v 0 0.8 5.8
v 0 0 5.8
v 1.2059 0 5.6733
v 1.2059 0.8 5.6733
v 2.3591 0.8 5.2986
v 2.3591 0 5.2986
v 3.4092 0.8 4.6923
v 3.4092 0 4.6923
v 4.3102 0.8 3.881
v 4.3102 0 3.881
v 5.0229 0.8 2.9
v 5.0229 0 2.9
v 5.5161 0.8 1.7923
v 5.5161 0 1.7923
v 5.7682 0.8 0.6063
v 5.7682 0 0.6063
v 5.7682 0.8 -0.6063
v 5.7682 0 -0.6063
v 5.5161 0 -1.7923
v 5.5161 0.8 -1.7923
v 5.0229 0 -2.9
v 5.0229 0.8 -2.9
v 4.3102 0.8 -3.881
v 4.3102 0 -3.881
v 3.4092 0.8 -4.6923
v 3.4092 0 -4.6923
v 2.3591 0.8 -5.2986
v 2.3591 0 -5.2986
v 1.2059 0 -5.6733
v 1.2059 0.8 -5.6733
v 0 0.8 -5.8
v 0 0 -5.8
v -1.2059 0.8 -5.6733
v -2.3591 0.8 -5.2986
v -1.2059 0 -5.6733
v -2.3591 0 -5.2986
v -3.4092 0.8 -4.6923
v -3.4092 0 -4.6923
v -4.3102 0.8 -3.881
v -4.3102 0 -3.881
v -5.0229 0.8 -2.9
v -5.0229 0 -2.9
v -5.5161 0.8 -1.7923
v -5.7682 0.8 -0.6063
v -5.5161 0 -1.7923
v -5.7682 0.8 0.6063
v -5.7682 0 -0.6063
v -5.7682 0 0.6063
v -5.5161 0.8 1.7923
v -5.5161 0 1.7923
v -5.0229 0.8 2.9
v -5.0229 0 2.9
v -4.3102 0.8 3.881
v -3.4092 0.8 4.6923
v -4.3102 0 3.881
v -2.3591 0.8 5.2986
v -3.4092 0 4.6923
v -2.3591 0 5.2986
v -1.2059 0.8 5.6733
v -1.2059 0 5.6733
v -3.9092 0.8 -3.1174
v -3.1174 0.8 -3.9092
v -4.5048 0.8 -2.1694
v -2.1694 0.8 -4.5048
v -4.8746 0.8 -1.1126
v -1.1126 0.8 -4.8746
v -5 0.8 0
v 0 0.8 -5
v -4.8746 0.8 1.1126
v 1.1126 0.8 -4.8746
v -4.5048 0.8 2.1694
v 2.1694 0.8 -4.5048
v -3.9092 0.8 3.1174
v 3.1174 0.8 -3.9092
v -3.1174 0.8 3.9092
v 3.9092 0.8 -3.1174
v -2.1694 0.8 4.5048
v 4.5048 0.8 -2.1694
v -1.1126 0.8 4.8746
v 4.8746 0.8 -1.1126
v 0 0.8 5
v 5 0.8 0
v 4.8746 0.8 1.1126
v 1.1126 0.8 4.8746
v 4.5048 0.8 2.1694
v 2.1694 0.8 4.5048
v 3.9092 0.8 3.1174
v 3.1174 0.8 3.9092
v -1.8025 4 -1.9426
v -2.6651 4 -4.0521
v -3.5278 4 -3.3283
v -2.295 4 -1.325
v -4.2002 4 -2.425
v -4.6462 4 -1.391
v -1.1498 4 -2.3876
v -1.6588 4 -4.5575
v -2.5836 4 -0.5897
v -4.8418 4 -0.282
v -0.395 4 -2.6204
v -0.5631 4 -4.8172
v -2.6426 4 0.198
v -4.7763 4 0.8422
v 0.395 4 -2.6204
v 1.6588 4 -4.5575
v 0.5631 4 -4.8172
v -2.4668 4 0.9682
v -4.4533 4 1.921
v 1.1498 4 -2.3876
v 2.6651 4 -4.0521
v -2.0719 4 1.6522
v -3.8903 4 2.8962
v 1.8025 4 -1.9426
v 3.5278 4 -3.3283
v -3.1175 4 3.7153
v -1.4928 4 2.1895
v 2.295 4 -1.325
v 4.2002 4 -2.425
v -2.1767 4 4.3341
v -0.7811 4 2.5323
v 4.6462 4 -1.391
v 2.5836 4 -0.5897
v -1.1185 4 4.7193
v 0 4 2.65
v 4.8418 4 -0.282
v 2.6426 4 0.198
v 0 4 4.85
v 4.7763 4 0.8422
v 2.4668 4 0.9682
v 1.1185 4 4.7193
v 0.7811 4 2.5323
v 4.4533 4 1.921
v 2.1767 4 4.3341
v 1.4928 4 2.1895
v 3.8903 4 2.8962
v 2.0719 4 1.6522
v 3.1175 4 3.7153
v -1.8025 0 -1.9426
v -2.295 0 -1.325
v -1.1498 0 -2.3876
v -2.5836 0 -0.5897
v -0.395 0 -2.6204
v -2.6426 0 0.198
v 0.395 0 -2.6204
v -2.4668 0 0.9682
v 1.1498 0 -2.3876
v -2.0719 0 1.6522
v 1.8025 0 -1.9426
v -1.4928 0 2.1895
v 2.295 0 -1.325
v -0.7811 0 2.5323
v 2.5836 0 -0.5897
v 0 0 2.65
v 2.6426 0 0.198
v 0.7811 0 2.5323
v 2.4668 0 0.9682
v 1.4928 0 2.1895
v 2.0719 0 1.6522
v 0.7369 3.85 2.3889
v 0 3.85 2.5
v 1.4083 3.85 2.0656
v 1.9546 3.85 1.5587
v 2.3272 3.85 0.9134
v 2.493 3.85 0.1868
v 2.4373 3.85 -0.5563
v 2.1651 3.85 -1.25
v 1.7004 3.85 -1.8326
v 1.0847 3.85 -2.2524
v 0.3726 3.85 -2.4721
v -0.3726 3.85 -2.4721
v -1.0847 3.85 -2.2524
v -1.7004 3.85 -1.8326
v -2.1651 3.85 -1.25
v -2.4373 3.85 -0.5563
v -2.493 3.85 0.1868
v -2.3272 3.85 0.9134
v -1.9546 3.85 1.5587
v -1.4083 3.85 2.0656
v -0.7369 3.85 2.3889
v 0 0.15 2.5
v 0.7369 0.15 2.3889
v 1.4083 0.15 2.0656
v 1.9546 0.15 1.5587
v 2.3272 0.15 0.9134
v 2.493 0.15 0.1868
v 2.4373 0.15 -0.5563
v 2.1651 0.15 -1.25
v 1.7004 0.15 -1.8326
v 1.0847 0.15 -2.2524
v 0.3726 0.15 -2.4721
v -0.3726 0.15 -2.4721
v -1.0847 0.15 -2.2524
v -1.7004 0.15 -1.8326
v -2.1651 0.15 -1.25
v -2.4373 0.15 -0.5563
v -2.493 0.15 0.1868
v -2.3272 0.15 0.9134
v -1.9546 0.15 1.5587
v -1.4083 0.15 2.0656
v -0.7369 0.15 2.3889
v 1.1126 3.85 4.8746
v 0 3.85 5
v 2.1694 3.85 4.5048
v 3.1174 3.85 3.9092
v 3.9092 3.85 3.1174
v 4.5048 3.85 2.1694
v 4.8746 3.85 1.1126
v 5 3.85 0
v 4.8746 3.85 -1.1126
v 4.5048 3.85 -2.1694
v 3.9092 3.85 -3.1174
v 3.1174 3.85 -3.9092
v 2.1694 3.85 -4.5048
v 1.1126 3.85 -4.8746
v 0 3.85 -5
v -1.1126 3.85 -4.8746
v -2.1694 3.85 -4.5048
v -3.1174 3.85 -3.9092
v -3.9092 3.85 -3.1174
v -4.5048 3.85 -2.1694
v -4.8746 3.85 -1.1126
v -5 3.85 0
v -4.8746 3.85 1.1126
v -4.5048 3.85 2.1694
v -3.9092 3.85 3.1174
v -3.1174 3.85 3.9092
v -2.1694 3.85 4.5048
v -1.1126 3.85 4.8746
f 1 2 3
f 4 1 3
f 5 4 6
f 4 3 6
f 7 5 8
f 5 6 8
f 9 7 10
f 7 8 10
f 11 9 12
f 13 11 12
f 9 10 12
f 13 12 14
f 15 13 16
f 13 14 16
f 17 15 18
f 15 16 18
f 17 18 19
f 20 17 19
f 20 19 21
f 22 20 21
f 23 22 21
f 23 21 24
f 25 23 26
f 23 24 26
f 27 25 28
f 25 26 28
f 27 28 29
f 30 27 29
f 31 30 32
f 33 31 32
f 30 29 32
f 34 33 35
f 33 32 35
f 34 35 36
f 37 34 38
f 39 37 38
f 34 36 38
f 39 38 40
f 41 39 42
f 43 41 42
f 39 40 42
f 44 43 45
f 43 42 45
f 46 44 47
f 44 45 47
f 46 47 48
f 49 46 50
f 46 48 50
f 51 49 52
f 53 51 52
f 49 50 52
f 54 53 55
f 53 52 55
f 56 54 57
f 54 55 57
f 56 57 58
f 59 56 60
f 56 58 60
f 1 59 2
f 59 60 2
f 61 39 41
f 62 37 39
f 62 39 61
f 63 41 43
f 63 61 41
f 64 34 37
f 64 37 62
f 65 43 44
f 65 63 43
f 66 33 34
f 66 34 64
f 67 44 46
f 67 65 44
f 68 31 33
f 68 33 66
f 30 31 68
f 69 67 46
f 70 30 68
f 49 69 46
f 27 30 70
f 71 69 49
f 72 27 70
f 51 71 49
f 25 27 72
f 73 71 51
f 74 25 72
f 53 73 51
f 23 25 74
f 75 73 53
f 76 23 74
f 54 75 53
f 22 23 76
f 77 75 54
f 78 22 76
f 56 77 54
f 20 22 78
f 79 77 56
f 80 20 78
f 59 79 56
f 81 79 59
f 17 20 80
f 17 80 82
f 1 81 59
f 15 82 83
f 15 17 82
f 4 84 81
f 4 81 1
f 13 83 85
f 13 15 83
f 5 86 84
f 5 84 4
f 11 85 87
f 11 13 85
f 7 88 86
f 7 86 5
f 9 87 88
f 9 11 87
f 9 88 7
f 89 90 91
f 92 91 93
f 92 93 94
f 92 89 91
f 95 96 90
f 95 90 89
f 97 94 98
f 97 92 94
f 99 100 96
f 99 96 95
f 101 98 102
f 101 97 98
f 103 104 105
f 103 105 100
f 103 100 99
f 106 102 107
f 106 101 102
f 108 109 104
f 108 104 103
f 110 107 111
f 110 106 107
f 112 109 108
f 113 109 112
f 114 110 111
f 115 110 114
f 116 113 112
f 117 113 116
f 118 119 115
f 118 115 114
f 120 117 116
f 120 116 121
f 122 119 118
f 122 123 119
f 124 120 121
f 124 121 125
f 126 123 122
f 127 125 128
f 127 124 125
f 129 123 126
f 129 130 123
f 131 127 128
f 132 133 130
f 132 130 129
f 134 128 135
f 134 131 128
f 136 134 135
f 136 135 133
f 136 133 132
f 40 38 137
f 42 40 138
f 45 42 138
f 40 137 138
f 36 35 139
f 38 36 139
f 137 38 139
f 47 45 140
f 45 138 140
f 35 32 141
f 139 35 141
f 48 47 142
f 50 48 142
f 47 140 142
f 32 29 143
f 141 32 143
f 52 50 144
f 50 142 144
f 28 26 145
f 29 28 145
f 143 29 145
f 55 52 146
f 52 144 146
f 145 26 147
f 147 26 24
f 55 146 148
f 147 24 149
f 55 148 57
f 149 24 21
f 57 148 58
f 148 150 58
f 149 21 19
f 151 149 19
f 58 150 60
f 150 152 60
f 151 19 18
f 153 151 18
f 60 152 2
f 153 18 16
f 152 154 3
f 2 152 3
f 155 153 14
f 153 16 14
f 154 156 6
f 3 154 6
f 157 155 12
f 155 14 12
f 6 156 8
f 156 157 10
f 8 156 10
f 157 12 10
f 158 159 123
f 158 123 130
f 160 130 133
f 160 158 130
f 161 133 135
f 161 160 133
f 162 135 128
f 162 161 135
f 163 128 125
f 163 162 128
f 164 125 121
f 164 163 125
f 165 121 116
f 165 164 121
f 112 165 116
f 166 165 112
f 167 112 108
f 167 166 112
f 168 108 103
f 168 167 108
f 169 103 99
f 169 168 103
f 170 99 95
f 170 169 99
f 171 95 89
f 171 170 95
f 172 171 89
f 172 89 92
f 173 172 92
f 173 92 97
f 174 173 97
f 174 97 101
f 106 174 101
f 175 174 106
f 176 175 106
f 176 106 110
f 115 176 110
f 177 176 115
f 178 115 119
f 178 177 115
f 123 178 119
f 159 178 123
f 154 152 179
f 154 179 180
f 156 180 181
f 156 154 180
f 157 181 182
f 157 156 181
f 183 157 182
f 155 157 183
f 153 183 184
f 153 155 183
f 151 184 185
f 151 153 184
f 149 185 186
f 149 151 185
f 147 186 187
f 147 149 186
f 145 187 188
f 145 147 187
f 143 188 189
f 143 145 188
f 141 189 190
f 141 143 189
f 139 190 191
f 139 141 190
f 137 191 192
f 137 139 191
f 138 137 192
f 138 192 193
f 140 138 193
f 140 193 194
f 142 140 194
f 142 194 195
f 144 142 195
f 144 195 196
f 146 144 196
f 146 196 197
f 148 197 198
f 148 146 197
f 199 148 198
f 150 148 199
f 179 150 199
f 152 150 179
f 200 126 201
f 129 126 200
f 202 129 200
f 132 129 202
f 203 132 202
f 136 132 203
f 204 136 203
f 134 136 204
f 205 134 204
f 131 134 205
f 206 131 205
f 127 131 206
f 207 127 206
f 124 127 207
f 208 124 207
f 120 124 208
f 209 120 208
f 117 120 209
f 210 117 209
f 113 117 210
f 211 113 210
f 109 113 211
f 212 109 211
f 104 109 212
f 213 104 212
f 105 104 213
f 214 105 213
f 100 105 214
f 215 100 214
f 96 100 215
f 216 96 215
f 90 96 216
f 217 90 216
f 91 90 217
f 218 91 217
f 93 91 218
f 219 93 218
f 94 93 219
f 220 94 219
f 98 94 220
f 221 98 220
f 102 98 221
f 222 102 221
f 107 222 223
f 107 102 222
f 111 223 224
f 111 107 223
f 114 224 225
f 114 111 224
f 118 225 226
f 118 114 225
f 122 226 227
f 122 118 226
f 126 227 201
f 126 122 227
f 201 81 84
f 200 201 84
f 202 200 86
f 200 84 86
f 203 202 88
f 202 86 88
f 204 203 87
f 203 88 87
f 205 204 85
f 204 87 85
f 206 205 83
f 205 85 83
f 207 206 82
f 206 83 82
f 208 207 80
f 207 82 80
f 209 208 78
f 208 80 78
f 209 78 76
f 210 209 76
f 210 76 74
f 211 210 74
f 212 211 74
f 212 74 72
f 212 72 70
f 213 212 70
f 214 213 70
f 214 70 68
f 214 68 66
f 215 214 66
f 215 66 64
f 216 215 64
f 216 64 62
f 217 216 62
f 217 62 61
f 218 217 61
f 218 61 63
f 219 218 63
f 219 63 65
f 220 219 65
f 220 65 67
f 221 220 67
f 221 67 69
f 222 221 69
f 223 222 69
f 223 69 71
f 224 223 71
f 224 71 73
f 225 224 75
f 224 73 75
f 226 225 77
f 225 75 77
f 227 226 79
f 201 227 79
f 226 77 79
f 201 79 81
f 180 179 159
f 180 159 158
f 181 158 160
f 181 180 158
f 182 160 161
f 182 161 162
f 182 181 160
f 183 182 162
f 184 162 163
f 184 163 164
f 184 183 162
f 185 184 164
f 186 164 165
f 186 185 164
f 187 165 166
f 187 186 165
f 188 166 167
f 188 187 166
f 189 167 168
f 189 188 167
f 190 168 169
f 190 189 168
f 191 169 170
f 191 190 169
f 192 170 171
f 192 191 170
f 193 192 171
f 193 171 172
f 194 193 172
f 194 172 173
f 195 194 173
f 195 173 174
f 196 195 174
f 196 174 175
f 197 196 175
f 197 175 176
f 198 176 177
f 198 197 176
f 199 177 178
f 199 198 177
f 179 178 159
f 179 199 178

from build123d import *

# Parameters (mm, degrees)
CROQUIS1_R              = 5.8
CROQUIS1_R_2            = 5
SALIENTE_EXTRUIR1_DEPTH = 0.8
CROQUIS1_3_R            = 5
CROQUIS1_3_R_2          = 2.5
SALIENTE_EXTRUIR2_DEPTH = 4
CHAFL_N1_SIZE           = 0.15


with BuildPart() as part:
    # Croquis1 → Saliente-Extruir1 (new body)
    with BuildSketch(Plane(origin=(0, 0, 0), x_dir=(1, 0, 0), z_dir=(0, 1, 0))):
        Circle(CROQUIS1_R)
        Circle(CROQUIS1_R_2, mode=Mode.SUBTRACT)
    extrude(amount=SALIENTE_EXTRUIR1_DEPTH)

    # Croquis1<3> → Saliente-Extruir2 (add)
    with BuildSketch(Plane(origin=(0, 0, 0), x_dir=(1, 0, 0), z_dir=(0, 1, 0))):
        Circle(CROQUIS1_3_R)
        Circle(CROQUIS1_3_R_2, mode=Mode.SUBTRACT)
    extrude(amount=SALIENTE_EXTRUIR2_DEPTH)

    # Chaflán1
    chafl_n1_edges = [part.edges().sort_by_distance(p)[0] for p in [
        (-2.5, 0, 0),
        (-2.5, 4, 0),
        (-5, 4, 0),
    ]]
    chamfer(chafl_n1_edges, length=CHAFL_N1_SIZE)


solid = part.part
